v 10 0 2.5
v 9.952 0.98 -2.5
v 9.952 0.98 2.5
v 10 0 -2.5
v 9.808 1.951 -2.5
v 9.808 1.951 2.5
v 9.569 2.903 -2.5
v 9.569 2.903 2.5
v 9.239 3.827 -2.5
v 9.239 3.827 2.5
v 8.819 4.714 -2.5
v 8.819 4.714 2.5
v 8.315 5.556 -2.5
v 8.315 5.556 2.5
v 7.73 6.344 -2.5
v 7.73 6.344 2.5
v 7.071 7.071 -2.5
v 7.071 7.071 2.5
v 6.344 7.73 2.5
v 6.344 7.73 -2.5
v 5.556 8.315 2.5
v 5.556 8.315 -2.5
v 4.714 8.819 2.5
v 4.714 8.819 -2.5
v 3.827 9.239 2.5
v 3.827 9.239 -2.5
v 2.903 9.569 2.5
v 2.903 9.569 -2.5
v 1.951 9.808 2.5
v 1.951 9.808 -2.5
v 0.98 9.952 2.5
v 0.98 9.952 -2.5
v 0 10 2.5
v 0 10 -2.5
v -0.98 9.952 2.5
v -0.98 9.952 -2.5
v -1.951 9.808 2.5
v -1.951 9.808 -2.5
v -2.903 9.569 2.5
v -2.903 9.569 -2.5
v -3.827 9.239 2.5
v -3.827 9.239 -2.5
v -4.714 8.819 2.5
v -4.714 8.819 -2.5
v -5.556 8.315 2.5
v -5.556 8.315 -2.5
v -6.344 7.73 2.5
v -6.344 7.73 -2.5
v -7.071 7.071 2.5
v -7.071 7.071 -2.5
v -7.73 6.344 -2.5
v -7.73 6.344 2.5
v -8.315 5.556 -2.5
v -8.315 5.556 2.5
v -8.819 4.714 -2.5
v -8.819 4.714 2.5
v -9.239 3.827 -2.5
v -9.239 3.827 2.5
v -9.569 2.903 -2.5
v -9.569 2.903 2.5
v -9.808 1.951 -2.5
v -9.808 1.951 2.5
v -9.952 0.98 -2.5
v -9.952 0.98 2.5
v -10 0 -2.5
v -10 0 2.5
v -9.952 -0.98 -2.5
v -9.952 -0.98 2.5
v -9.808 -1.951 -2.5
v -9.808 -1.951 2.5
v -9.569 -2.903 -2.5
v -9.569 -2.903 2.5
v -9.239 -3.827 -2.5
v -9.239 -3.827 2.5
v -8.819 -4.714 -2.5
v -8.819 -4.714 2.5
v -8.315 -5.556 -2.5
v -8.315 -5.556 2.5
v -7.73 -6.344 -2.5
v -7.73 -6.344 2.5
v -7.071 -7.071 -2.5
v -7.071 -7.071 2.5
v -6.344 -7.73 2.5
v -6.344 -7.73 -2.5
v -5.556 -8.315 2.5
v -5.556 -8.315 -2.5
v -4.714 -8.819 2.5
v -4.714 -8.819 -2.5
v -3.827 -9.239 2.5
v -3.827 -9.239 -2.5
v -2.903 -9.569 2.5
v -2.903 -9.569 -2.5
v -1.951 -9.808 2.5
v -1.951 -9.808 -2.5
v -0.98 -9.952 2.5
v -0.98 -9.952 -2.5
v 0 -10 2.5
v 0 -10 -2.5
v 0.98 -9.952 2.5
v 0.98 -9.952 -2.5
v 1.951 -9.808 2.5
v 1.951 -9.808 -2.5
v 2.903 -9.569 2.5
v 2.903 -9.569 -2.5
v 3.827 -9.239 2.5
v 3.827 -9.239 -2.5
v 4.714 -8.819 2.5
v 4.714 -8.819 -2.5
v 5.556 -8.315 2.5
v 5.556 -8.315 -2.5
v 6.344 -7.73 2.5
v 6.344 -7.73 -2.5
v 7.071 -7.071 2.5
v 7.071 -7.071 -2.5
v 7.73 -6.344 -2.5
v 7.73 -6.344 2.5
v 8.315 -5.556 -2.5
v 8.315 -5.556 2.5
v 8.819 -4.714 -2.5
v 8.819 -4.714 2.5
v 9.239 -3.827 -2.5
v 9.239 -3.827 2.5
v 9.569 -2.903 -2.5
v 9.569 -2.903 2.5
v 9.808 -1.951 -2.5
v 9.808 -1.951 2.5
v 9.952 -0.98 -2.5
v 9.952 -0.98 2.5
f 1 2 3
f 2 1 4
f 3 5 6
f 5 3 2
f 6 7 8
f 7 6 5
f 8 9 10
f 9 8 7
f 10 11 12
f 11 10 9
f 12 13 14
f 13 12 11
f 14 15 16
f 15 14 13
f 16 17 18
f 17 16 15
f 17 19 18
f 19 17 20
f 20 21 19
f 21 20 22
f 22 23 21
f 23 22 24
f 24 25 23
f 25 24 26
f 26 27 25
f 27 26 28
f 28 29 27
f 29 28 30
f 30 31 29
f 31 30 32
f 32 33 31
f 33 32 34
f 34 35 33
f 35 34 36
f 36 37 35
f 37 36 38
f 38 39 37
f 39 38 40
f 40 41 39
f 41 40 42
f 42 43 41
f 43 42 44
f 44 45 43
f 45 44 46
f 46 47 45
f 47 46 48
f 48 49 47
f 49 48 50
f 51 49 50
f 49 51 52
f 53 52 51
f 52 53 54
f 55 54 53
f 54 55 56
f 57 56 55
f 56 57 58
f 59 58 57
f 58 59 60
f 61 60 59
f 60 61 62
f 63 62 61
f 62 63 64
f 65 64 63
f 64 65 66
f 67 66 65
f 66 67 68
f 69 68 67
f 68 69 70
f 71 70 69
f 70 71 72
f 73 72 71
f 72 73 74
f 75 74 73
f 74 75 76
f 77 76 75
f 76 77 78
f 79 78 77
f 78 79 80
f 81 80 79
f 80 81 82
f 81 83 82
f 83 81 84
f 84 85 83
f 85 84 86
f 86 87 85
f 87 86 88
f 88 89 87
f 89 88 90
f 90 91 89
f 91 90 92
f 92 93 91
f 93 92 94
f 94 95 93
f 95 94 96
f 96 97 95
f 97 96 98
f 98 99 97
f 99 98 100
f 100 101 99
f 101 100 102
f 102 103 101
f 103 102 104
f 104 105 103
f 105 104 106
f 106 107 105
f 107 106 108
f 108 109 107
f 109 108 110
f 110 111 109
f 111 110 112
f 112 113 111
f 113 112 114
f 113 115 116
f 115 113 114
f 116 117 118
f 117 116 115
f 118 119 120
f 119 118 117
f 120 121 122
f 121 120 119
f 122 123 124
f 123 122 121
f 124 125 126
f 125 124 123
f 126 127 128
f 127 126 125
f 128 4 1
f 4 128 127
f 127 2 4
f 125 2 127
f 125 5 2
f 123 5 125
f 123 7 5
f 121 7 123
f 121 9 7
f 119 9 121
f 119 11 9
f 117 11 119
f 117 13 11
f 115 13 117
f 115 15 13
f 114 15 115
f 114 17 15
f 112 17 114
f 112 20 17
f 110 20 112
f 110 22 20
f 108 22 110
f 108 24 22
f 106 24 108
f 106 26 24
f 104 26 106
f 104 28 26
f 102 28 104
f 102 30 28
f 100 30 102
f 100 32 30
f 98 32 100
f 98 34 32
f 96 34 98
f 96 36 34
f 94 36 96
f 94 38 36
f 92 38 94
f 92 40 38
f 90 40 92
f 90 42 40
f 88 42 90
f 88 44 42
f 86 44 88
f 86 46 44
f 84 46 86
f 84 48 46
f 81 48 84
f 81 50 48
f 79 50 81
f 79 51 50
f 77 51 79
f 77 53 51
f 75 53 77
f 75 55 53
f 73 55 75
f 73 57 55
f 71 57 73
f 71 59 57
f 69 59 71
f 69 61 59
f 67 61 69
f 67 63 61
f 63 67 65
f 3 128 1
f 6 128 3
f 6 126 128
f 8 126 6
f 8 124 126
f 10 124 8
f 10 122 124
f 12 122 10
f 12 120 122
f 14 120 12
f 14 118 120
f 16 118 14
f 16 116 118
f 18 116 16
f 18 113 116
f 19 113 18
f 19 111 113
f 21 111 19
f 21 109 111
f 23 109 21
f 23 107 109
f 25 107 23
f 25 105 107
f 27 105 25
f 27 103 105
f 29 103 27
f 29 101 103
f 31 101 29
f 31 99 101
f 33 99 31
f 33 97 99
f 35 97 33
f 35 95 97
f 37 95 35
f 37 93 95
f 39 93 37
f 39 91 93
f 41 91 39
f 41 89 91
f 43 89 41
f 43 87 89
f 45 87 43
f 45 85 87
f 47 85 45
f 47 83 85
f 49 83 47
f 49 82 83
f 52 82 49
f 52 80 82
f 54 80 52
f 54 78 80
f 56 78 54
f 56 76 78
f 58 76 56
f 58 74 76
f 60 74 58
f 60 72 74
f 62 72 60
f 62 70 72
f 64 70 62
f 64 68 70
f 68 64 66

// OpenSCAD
// Parameters
magnet_type = 0; //[0:20:1]
magnet_od = 20; //[10:40:1]
magnet_h = 5; //[2.5:10:0.5]
magnet_id = 0; //[0:20:1]

// Magnet - complete geometry
module magnet() {
  color([0.72, 0.45, 0.2]) { // Copper color for the magnet
    difference() {
      // Outer body of the magnet
      cylinder(r=magnet_od/2, h=magnet_h, center=true, $fn=64);
      // Inner bore (if any)
      if (magnet_id > 0) {
        cylinder(r=magnet_id/2, h=magnet_h + 2, center=true, $fn=64);
      }
    }
  }
}

// Assembly
module assembly() {
  magnet();
}

assembly();
